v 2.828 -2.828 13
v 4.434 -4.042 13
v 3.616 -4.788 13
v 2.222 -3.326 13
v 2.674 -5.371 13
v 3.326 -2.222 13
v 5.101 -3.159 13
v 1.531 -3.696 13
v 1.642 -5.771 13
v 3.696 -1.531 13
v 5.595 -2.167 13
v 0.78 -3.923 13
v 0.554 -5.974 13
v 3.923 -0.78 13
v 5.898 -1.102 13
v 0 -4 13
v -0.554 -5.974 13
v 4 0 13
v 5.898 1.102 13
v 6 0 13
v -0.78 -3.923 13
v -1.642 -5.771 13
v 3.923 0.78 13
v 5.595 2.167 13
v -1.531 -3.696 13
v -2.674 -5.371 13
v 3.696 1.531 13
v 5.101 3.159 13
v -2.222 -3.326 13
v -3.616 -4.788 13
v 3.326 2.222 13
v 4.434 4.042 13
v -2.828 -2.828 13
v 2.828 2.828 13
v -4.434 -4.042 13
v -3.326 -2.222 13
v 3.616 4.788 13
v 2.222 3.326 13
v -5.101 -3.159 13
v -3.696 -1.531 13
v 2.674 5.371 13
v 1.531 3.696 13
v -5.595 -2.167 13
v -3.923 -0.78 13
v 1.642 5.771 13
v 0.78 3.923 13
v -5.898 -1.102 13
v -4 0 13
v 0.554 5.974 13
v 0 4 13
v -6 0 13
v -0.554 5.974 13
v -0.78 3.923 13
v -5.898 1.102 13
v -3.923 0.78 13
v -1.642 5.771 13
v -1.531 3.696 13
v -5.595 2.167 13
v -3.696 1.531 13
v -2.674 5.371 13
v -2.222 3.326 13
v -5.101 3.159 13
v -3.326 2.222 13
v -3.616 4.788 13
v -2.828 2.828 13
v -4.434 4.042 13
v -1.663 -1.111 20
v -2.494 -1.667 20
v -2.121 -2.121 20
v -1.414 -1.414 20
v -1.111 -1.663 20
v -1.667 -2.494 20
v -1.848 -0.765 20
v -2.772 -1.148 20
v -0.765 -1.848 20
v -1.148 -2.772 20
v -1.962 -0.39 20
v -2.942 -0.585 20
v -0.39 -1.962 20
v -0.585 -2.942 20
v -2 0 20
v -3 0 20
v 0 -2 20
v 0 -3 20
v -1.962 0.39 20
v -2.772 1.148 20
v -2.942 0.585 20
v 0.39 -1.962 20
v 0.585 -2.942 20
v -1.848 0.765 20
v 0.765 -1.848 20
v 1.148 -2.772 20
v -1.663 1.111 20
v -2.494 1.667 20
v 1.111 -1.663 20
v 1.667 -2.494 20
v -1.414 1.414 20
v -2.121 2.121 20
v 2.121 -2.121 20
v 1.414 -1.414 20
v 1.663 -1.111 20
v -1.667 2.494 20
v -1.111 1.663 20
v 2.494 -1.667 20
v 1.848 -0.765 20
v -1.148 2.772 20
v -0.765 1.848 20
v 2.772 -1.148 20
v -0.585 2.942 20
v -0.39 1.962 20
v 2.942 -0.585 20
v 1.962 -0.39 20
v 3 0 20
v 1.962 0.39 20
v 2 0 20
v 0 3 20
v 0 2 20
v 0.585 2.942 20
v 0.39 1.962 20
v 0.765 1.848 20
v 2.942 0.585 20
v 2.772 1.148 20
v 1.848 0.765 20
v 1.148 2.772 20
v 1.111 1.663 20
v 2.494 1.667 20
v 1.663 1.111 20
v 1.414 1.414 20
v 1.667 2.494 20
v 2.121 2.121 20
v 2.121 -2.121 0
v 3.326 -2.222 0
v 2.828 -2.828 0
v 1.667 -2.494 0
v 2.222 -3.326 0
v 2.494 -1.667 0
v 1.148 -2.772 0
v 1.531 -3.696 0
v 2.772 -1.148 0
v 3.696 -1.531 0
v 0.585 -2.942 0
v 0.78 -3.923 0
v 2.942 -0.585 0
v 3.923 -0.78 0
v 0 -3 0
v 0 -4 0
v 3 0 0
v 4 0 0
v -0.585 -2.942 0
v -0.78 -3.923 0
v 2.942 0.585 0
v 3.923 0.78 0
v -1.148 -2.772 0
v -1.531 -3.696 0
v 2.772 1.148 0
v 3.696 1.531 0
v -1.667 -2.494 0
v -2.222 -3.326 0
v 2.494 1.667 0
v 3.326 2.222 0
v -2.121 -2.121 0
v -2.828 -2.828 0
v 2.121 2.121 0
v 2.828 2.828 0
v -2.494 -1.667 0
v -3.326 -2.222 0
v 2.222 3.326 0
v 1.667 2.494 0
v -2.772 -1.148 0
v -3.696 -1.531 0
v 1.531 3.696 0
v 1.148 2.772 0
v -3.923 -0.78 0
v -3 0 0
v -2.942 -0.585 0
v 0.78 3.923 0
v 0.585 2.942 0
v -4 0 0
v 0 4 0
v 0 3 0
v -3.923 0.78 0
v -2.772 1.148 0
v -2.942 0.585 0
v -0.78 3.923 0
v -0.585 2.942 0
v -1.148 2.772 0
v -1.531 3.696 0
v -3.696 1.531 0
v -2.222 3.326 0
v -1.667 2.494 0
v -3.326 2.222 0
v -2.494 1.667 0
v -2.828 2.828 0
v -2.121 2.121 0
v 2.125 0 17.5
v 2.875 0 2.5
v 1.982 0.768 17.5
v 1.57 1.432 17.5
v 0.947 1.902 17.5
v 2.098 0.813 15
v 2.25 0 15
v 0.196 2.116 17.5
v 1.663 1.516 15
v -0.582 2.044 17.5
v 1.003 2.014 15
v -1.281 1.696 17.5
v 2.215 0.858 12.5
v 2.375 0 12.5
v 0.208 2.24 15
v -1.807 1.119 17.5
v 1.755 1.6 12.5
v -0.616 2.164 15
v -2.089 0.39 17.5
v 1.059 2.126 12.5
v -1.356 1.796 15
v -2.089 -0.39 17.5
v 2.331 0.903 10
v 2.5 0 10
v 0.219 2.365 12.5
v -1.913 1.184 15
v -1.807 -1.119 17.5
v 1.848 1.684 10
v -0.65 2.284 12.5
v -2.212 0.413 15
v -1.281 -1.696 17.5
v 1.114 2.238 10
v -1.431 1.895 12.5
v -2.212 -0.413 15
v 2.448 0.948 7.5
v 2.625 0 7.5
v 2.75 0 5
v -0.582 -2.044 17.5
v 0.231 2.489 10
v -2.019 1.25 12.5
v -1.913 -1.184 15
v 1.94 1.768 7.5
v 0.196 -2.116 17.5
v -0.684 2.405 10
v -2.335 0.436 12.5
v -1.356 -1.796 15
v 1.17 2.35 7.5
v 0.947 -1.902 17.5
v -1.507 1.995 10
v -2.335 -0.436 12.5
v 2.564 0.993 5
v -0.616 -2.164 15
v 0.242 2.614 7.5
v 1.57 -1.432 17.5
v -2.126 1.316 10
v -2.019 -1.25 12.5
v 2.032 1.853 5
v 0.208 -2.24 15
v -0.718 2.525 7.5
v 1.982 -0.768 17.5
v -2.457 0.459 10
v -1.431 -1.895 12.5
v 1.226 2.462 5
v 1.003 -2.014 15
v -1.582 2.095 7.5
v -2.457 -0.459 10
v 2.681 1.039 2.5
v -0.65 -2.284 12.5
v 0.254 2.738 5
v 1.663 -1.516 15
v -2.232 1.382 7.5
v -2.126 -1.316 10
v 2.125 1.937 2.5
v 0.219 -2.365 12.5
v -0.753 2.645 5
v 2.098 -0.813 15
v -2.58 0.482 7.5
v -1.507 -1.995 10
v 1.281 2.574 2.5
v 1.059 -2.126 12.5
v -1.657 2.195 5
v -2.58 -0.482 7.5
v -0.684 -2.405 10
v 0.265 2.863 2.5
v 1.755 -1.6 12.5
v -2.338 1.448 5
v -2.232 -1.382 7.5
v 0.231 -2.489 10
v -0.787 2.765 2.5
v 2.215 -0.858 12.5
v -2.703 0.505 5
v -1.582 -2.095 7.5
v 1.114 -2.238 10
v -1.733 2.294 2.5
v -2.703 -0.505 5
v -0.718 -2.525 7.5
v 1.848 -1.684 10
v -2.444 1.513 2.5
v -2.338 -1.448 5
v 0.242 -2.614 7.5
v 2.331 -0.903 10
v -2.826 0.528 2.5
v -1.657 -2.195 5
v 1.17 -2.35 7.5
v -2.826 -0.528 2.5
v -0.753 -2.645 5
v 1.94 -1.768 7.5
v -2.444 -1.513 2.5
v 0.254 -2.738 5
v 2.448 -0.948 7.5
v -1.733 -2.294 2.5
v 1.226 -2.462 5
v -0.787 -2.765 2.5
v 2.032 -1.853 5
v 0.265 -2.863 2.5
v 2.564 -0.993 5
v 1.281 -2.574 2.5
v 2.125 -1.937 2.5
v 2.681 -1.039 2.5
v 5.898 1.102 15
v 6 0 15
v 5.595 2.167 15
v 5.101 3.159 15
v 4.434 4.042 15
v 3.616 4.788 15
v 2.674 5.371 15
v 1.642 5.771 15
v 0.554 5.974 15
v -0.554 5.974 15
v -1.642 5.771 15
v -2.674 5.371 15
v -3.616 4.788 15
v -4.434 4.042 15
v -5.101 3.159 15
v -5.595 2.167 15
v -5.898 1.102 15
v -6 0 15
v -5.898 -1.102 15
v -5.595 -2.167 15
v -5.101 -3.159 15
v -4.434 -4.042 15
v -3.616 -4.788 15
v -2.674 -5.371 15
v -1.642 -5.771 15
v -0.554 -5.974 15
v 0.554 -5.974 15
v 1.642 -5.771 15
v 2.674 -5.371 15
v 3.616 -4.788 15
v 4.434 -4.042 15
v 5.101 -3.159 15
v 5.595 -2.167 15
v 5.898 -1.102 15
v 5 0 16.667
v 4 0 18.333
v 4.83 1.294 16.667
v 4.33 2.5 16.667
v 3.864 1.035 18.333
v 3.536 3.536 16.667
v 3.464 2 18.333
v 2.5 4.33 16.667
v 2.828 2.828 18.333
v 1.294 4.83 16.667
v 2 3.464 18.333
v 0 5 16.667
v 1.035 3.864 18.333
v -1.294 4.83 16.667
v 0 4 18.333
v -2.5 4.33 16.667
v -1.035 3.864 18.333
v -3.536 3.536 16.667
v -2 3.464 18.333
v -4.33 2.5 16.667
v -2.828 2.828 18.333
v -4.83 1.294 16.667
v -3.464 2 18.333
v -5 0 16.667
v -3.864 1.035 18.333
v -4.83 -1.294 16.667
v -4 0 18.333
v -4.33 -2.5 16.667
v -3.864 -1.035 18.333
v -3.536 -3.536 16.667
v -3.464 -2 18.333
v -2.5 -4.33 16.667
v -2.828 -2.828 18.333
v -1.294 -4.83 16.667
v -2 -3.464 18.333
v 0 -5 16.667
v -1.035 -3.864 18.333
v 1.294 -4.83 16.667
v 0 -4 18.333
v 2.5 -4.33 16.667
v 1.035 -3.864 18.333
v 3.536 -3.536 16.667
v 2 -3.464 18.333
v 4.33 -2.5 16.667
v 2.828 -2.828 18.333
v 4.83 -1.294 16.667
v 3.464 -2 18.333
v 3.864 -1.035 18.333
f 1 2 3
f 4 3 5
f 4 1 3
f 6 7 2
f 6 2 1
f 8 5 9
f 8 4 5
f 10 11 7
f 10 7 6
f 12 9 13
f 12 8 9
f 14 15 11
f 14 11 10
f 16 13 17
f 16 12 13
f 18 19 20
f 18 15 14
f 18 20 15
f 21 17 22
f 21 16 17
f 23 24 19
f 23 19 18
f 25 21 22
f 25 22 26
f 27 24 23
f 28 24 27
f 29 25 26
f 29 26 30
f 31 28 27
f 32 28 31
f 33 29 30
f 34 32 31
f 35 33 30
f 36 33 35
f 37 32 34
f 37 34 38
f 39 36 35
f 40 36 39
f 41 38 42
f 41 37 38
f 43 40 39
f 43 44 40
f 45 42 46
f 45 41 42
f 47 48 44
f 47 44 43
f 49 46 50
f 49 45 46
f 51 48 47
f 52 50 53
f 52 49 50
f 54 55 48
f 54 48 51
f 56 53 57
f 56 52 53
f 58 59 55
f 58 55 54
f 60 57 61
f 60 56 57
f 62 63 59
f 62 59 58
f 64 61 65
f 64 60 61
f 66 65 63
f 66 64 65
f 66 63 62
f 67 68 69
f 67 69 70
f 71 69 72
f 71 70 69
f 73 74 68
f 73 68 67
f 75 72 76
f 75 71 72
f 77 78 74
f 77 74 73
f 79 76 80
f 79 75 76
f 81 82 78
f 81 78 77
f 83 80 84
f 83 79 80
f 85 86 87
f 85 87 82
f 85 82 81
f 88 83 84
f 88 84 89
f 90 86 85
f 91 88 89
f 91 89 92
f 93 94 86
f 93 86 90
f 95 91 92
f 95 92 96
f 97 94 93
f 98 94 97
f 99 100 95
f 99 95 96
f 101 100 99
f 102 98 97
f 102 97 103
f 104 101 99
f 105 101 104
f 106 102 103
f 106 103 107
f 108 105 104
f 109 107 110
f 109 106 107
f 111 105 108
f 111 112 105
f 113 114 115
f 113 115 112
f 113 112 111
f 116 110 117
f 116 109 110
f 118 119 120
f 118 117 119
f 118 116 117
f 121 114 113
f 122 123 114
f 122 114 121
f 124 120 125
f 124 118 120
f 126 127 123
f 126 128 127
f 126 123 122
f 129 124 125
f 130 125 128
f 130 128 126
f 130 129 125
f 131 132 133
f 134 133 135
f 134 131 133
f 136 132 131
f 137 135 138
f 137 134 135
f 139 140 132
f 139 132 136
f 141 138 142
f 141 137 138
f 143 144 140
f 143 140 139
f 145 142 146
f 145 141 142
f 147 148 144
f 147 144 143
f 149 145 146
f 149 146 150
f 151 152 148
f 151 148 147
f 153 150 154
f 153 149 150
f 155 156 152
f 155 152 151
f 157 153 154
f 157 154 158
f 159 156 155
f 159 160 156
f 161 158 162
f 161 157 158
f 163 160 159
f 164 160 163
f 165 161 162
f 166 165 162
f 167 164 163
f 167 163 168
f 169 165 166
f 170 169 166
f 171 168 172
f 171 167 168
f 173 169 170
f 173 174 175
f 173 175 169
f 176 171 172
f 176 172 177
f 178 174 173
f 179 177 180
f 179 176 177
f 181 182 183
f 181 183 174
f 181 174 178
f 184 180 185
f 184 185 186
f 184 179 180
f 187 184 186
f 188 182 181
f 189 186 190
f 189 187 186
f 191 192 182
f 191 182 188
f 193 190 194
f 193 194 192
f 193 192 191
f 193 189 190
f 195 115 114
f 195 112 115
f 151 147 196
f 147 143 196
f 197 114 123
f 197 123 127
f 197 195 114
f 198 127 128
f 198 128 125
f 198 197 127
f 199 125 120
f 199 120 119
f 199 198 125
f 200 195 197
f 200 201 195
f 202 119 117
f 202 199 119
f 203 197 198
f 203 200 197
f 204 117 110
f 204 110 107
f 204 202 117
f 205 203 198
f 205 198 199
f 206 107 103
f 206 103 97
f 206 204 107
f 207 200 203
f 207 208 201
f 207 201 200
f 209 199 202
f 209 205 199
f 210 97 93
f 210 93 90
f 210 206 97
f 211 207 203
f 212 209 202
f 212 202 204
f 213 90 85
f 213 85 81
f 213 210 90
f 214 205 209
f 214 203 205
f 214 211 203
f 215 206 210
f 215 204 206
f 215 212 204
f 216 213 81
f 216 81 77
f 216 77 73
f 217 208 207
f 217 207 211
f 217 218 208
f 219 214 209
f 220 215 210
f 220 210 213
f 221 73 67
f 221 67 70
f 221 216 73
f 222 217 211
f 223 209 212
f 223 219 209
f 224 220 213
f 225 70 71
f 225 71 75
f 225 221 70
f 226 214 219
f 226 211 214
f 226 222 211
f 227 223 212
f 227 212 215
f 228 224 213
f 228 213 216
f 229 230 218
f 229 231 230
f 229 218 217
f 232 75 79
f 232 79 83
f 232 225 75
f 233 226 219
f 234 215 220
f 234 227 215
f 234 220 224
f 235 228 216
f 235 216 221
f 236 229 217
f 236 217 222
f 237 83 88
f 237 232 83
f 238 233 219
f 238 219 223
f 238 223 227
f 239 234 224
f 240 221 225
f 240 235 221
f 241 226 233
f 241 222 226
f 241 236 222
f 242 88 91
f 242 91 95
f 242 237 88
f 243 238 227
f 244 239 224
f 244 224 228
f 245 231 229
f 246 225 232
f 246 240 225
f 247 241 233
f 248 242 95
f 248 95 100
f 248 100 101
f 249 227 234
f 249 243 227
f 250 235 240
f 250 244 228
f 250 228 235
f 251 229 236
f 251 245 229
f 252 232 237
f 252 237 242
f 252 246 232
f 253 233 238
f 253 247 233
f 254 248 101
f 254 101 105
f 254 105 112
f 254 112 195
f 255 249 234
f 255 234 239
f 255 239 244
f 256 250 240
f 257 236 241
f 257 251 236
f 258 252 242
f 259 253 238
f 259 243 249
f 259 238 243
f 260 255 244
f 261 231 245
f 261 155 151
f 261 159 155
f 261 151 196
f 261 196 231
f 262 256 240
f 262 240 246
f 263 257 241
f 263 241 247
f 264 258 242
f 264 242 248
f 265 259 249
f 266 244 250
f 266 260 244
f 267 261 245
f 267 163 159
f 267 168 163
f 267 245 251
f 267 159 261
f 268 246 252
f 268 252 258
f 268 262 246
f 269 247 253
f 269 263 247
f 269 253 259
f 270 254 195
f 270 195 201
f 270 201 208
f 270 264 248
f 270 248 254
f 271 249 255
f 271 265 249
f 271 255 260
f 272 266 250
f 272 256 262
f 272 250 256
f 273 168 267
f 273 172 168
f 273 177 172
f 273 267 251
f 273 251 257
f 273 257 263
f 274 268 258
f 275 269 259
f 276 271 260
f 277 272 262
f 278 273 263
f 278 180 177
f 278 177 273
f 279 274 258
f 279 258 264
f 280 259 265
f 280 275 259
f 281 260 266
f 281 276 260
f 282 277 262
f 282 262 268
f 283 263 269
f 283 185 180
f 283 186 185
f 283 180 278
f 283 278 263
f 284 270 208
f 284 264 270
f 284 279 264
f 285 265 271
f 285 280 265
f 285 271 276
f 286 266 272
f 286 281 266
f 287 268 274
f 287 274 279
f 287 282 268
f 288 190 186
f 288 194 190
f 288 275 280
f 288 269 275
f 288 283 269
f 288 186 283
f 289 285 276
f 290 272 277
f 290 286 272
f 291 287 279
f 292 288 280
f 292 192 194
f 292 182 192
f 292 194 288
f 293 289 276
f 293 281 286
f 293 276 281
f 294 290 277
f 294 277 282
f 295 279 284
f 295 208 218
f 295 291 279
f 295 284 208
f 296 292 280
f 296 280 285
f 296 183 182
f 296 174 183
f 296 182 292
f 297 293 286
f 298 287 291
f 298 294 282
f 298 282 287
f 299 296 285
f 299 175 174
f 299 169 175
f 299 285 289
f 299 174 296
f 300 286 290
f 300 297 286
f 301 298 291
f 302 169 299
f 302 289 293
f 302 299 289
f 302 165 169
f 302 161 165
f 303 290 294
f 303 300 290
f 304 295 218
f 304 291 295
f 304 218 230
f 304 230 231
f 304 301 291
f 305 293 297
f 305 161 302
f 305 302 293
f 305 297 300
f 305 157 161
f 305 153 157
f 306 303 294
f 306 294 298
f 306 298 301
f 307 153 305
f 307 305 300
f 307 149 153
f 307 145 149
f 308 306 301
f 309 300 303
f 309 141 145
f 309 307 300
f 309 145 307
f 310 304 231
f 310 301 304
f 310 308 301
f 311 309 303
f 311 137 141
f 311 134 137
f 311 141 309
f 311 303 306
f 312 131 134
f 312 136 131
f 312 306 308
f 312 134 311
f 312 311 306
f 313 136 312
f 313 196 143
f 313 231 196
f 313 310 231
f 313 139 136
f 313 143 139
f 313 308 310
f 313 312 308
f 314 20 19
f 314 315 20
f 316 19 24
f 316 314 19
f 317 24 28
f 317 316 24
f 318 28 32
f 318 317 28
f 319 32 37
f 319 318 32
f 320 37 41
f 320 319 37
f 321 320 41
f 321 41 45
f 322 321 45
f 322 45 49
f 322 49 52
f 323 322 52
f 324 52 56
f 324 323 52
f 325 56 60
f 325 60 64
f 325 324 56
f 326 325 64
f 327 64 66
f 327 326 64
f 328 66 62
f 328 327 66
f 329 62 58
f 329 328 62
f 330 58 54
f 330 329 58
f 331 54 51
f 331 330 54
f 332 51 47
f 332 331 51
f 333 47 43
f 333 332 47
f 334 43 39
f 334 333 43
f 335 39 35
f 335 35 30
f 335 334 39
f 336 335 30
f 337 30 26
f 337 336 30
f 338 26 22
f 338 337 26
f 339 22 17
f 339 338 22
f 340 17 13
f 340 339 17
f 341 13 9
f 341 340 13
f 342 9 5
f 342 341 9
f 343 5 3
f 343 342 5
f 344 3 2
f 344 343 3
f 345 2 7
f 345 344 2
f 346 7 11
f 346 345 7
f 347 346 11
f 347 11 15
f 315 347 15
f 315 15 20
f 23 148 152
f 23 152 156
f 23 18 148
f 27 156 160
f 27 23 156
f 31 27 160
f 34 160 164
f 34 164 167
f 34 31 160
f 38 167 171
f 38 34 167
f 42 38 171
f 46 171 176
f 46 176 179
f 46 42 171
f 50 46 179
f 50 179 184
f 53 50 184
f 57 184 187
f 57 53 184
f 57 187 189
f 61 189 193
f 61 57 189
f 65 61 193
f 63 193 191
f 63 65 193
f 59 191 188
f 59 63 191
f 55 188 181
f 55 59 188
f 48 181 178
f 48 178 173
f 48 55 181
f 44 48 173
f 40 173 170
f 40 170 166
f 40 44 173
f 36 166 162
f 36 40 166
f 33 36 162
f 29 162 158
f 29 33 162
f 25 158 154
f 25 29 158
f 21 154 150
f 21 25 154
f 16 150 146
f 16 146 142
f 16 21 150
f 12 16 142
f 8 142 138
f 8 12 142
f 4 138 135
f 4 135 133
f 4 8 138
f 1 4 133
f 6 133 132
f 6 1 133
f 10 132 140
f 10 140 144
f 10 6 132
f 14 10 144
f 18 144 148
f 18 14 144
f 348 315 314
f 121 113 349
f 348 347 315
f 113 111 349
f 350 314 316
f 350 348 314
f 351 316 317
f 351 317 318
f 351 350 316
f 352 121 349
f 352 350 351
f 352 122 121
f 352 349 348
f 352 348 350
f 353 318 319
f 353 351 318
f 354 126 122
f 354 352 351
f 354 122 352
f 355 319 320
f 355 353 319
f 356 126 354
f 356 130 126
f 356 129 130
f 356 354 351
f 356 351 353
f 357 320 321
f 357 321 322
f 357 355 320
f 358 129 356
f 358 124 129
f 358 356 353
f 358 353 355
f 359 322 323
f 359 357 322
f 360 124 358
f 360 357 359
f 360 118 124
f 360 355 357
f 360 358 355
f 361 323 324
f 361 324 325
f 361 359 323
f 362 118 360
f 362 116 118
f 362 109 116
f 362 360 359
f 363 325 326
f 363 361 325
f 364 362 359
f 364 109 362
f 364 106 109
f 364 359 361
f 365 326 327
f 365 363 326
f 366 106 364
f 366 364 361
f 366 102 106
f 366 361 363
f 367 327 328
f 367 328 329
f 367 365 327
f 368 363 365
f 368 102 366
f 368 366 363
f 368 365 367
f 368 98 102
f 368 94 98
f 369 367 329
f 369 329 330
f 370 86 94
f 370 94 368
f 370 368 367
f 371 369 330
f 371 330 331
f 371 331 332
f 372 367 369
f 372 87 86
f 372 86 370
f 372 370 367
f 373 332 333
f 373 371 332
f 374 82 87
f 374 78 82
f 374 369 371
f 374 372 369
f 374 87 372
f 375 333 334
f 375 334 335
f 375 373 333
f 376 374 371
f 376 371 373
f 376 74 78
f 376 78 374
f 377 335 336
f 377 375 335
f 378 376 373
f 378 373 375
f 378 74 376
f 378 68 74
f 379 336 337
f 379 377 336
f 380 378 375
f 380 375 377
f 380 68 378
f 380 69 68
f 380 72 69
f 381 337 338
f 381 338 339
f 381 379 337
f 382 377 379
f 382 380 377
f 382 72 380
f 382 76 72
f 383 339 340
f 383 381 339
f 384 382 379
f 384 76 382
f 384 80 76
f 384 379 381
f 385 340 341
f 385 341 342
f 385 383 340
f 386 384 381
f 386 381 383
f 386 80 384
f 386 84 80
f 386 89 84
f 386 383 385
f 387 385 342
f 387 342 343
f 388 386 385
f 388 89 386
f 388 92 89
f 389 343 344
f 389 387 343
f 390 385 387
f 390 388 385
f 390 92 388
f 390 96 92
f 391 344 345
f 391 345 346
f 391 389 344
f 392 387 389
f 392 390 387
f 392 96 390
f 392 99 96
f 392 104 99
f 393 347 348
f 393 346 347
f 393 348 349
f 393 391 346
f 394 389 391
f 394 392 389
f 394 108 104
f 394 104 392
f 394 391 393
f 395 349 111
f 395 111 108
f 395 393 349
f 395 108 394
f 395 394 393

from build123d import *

# Parameters (mm, degrees)
F0_W = 2
F0_H = 2


# Not quite as in the source:
# - a feature names something its author has since deleted; it is built from what else it names


with BuildPart() as f1:
    # F0 (on Front) → F1 (revolve)
    with BuildSketch(Plane.XZ):
        with Locations((5, 14)):
            Rectangle(F0_W, F0_H)
        Polygon((4, 13), (4, 15), (3, 20), (2, 20), (3, 0), (4, 0), align=None)
        Polygon((3, 20), (4, 15), (6, 15), align=None)
    revolve(axis=Axis((0, 0, 10.5782048777), (0, 0, 1)))


solid = f1.part
